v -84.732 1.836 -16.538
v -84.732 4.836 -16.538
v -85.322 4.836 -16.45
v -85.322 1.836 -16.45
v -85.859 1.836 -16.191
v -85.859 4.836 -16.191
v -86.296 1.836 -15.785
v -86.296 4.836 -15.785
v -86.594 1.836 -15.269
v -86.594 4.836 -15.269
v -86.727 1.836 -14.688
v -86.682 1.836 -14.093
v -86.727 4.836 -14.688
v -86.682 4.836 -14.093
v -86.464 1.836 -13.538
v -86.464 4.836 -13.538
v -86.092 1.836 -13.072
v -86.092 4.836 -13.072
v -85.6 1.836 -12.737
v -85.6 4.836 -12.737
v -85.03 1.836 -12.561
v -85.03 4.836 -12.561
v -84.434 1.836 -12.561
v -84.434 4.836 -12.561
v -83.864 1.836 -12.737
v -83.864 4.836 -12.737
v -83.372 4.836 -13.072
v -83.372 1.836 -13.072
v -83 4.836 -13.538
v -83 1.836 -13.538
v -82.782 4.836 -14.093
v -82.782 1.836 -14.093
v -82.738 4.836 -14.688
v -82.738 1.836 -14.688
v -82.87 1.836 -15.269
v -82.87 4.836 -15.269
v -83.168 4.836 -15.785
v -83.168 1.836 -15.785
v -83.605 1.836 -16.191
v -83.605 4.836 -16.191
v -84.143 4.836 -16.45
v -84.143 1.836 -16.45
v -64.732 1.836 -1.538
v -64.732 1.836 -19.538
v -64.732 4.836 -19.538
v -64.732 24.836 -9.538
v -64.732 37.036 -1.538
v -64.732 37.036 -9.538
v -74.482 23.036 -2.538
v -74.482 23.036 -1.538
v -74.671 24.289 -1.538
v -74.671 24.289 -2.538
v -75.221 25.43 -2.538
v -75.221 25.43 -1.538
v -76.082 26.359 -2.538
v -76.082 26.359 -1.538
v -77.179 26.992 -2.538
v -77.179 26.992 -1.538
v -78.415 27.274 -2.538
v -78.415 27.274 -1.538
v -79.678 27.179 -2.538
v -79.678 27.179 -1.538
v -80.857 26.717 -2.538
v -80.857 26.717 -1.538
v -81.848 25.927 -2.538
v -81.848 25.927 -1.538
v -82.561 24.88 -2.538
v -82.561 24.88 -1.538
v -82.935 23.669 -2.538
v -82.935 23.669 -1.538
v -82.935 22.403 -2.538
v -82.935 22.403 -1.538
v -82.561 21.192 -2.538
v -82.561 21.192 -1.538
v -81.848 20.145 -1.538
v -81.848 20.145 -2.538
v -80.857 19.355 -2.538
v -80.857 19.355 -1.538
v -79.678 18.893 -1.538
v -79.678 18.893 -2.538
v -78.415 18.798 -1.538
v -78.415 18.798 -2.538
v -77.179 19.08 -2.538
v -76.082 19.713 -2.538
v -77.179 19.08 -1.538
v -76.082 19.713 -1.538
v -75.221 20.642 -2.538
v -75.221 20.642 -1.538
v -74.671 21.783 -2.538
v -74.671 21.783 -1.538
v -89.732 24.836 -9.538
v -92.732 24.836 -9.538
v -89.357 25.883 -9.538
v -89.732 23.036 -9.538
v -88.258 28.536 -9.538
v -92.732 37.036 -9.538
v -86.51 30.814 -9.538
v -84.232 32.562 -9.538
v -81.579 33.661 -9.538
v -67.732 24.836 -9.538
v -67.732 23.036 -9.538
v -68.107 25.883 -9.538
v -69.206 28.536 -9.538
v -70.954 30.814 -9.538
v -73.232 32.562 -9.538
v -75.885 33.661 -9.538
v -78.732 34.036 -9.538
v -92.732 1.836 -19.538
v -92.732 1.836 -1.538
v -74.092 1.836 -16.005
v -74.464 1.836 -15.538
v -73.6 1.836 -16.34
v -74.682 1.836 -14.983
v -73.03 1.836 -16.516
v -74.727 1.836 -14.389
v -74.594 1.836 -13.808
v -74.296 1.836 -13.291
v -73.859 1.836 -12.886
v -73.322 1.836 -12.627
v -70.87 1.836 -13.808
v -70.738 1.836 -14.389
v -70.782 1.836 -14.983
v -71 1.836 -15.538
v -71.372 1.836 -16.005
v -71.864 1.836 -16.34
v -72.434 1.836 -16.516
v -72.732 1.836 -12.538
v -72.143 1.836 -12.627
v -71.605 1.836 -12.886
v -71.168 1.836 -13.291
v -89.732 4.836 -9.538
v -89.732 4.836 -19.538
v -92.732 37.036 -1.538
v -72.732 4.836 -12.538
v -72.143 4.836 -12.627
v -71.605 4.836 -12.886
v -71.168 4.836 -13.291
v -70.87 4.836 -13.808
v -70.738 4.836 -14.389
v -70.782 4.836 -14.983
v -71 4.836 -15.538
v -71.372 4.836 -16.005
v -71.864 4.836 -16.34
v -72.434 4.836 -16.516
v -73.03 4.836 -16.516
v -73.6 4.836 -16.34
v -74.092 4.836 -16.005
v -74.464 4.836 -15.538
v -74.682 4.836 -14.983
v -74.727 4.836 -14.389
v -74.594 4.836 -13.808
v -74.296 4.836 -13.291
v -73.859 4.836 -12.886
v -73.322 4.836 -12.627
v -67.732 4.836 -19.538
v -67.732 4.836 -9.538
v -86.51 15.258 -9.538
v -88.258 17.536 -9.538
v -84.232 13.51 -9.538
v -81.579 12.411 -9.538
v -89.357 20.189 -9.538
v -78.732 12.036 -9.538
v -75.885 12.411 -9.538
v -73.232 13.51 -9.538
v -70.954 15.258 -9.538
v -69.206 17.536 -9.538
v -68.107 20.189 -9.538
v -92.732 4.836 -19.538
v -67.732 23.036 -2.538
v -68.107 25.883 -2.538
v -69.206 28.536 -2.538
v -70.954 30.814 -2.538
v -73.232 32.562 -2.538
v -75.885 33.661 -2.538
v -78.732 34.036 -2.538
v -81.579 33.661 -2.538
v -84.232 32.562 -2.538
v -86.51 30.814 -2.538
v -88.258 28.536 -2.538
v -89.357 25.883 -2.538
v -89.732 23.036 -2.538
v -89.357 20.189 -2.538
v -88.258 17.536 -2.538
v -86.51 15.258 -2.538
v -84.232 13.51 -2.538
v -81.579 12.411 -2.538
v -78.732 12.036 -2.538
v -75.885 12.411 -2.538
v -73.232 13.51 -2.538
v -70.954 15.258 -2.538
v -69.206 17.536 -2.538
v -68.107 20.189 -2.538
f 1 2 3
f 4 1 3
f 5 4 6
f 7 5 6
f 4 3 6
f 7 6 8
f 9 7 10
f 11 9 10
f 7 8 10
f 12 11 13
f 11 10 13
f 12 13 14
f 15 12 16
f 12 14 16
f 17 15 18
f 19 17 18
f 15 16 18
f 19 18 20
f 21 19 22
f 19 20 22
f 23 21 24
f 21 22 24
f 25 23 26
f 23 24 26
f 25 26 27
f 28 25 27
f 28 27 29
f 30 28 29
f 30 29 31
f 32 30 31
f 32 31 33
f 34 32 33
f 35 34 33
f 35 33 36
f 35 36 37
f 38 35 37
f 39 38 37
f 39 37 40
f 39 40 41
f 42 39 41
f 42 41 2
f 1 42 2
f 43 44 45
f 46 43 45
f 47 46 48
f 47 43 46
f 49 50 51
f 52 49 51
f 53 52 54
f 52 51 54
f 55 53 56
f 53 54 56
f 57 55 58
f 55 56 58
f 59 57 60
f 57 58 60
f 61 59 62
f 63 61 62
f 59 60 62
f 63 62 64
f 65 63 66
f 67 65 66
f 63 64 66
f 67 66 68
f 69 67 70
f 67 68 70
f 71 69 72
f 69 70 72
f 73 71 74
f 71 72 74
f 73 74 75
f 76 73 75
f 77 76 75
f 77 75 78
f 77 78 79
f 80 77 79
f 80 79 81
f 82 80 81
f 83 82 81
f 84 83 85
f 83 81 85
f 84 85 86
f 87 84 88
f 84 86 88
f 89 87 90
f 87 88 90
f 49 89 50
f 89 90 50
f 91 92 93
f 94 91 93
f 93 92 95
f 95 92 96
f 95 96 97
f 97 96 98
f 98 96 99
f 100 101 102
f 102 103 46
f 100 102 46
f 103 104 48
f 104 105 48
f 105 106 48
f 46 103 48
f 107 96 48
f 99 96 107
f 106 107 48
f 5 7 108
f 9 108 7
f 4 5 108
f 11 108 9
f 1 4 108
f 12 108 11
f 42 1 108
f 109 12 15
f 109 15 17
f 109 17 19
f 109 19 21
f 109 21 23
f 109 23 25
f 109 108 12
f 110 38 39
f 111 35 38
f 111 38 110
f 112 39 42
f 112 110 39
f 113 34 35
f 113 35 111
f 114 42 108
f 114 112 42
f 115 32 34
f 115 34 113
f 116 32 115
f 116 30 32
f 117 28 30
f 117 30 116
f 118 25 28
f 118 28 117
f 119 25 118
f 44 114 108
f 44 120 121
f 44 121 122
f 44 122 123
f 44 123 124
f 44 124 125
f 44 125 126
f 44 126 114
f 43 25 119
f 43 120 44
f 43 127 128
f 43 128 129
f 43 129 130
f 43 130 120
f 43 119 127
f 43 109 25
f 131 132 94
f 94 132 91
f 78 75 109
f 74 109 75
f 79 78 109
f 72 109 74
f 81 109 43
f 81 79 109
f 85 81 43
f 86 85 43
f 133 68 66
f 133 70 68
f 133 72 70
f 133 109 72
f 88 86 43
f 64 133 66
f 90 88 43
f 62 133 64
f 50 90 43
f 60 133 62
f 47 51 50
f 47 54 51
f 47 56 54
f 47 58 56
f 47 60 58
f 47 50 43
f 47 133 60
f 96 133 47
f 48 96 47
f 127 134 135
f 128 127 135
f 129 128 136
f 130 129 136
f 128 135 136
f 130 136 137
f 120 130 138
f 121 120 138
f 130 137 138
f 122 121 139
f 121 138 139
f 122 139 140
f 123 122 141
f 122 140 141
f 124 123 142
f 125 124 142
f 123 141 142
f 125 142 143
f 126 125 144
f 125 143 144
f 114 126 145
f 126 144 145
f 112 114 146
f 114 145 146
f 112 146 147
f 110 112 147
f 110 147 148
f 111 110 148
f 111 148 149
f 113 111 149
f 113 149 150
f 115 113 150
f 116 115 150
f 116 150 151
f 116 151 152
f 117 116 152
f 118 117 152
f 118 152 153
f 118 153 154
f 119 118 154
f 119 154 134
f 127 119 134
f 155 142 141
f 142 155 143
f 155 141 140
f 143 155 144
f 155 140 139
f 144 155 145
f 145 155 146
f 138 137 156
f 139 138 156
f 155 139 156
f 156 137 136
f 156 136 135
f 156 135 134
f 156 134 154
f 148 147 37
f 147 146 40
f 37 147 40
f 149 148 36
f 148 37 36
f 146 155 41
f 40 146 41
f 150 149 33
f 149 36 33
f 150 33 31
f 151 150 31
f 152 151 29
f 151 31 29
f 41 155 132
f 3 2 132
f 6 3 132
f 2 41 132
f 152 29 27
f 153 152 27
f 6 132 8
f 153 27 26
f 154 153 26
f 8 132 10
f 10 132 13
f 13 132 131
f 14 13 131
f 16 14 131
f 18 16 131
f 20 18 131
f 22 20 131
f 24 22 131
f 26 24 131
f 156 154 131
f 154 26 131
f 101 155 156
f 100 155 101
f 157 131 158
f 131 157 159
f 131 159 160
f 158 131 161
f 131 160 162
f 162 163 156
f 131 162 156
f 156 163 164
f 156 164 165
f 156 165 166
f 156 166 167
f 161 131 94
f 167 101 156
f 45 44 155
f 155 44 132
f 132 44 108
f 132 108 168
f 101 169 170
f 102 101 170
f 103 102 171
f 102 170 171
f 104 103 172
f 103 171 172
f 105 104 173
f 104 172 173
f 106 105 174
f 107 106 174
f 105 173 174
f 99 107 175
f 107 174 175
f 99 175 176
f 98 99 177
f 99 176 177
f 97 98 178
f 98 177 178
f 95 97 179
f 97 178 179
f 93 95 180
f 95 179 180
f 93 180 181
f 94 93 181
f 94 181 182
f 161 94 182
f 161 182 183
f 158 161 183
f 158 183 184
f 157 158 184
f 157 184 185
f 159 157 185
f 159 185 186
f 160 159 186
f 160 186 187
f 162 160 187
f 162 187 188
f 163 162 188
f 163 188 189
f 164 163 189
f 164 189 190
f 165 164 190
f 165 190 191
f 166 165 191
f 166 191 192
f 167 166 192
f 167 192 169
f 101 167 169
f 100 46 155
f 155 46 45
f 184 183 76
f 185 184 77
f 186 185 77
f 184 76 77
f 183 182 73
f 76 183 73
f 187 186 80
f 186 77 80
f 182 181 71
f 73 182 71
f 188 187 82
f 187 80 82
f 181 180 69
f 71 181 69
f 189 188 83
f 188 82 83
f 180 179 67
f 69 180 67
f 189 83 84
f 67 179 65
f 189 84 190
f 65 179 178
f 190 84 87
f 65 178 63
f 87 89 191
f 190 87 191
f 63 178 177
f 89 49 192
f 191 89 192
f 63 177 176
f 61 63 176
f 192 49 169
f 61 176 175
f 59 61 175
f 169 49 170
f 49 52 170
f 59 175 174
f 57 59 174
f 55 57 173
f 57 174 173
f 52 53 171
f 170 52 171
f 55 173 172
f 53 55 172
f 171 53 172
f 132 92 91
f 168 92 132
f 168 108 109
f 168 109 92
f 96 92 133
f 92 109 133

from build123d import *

# Parameters (mm, degrees)
SKETCH2_W           = 28
SKETCH2_H           = 35.2
SKETCH2_R           = 11
BOSS_EXTRUDE3_DEPTH = 7
SKETCH3_W           = 10
SKETCH3_H           = 3
BOSS_EXTRUDE4_DEPTH = 28
BOSS_EXTRUDE5_DEPTH = 3
BOSS_EXTRUDE6_START = -28
BOSS_EXTRUDE6_DEPTH = 3
SKETCH4_R           = 2
CUT_EXTRUDE1_DEPTH  = 101.089134132
BOSS_EXTRUDE7_START = 1
SKETCH2_3_W         = 28
SKETCH2_3_H         = 35.2
SKETCH2_3_R         = 11
SKETCH2_3_R_2       = 10.7
SKETCH2_3_R_3       = 9.65
SKETCH2_3_R_4       = 4.25
BOSS_EXTRUDE7_DEPTH = 1


with BuildPart() as part:
    # Sketch2 → Boss-Extrude3 (new body)
    with BuildSketch(Plane.XY.offset(-2.538447986)):
        with Locations((-78.732107824, 19.43595021)):
            Rectangle(SKETCH2_W, SKETCH2_H)
        with Locations((-78.732107824, 23.03595021)):
            Circle(SKETCH2_R, mode=Mode.SUBTRACT)
    extrude(amount=-BOSS_EXTRUDE3_DEPTH)

    # Sketch3 → Boss-Extrude4 (add)
    with BuildSketch(Plane.ZY.offset(92.732107824)):
        with Locations((-14.538447986, 3.33595021)):
            Rectangle(SKETCH3_W, SKETCH3_H)
    extrude(amount=-BOSS_EXTRUDE4_DEPTH)

    # Sketch3<3> → Boss-Extrude5 (add)
    with BuildSketch(Plane.ZY.offset(92.732107824)):
        Polygon((-19.538447986, 4.83595021), (-9.538447986, 4.83595021), (-9.538447986, 24.83595021), align=None)
    extrude(amount=-BOSS_EXTRUDE5_DEPTH)

    # Sketch3<4> → Boss-Extrude6 (add)
    with BuildSketch(Plane.ZY.offset(92.732107824).offset(BOSS_EXTRUDE6_START)):
        Polygon((-19.538447986, 4.83595021), (-9.538447986, 4.83595021), (-9.538447986, 24.83595021), align=None)
    extrude(amount=BOSS_EXTRUDE6_DEPTH)

    # Sketch4 → Cut-Extrude1 (cut, through all)
    with BuildSketch(Plane(origin=(0, 4.83595021, 0), x_dir=(1, 0, 0), z_dir=(0, 1, 0))):
        with Locations(Location((-72.732107824, 14.538447986, 0), (0, 0, 270))):
            Circle(SKETCH4_R)
        with Locations(Location((-84.732107824, 14.538447986, 0), (0, 0, 90))):
            Circle(SKETCH4_R)
    extrude(amount=-CUT_EXTRUDE1_DEPTH, mode=Mode.SUBTRACT)

    # Sketch2<3> → Boss-Extrude7 (add)
    # profile 1 of 4: a face of its own
    with BuildSketch(Plane.XY.offset(-2.538447986).offset(BOSS_EXTRUDE7_START)):
        with Locations((-78.732107824, 19.43595021)):
            Rectangle(SKETCH2_3_W, SKETCH2_3_H)
        with Locations((-78.732107824, 23.03595021)):
            Circle(SKETCH2_3_R, mode=Mode.SUBTRACT)
    # profile 2 of 4: a face of its own
    with BuildSketch(Plane.XY.offset(-2.538447986).offset(BOSS_EXTRUDE7_START)):
        with Locations((-78.732107824, 23.03595021)):
            Circle(SKETCH2_3_R)
        with Locations((-78.732107824, 23.03595021)):
            Circle(SKETCH2_3_R_2, mode=Mode.SUBTRACT)
    # profile 3 of 4: a face of its own
    with BuildSketch(Plane.XY.offset(-2.538447986).offset(BOSS_EXTRUDE7_START)):
        with Locations((-78.732107824, 23.03595021)):
            Circle(SKETCH2_3_R_2)
        with Locations((-78.732107824, 23.03595021)):
            Circle(SKETCH2_3_R_3, mode=Mode.SUBTRACT)
    # profile 4 of 4: a face of its own
    with BuildSketch(Plane.XY.offset(-2.538447986).offset(BOSS_EXTRUDE7_START)):
        with Locations((-78.732107824, 23.03595021)):
            Circle(SKETCH2_3_R_3)
        with Locations((-78.732107824, 23.03595021)):
            Circle(SKETCH2_3_R_4, mode=Mode.SUBTRACT)
    extrude(amount=-BOSS_EXTRUDE7_DEPTH)


solid = part.part
